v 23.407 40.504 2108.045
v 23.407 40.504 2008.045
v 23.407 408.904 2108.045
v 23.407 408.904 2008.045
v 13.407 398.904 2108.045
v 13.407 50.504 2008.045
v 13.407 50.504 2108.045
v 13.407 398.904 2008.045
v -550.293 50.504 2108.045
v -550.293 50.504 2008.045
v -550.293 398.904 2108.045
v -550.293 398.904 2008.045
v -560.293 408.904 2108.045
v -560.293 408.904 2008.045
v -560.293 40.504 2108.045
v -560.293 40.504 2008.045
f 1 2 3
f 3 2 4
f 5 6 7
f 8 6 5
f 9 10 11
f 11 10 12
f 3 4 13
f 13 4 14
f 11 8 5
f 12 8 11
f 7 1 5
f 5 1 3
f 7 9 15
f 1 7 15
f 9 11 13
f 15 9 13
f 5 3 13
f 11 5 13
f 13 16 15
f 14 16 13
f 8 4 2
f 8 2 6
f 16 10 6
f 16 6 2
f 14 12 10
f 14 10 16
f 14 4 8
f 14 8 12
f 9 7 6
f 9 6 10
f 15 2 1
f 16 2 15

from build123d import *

# Parameters (mm, degrees)
EXTRUDE_START         = -100
EXTRUDE_1_OUTLINE_W   = 579.7
EXTRUDE_1_OUTLINE_H   = 368.4
EXTRUDE_1_OUTLINE_W_2 = 559.7
EXTRUDE_1_OUTLINE_H_2 = 348.4
EXTRUDE_1_DEPTH       = 100
SKETCH_3_W            = 2
SKETCH_3_H            = 368.4
EXTRUDE_2_DEPTH       = 100
SKETCH_4_W            = 2
SKETCH_4_H            = 348.4
CUT_EXTRUDE_3_DEPTH   = 100


# Read off the part's stored shape, not the designer's step: 填料-伸長1
with BuildPart() as part:
    # 填料-伸長1 outline → 填料-伸長1 (new body)
    with BuildSketch(Plane(origin=(0, 0, 2008.045378916), x_dir=(-1, 0, 0), z_dir=(0, 0, -1)).offset(EXTRUDE_START)):
        with Locations((268.443182196, 224.704175019)):
            Rectangle(EXTRUDE_1_OUTLINE_W, EXTRUDE_1_OUTLINE_H)
        with Locations((268.443182196, 224.704175019)):
            Rectangle(EXTRUDE_1_OUTLINE_W_2, EXTRUDE_1_OUTLINE_H_2, mode=Mode.SUBTRACT)
    extrude(amount=EXTRUDE_1_DEPTH)

    # 草圖3 → 填料-伸長2 (add)
    with BuildSketch(Plane(origin=(0, 0, 2008.045378916), x_dir=(-1, 0, 0), z_dir=(0, 0, -1))):
        with Locations((-22.406817804, 224.704175019)):
            Rectangle(SKETCH_3_W, SKETCH_3_H)
        with Locations((559.293182196, 224.704175019)):
            Rectangle(SKETCH_3_W, SKETCH_3_H)
    extrude(amount=-EXTRUDE_2_DEPTH)

    # 草圖4 → 除料-伸長3 (cut)
    with BuildSketch(Plane(origin=(0, 0, 2008.045378916), x_dir=(-1, 0, 0), z_dir=(0, 0, -1))):
        with Locations((-12.406817804, 224.704175019)):
            Rectangle(SKETCH_4_W, SKETCH_4_H)
        with Locations((549.293182196, 224.704175019)):
            Rectangle(SKETCH_4_W, SKETCH_4_H)
    extrude(amount=-CUT_EXTRUDE_3_DEPTH, mode=Mode.SUBTRACT)


solid = part.part
